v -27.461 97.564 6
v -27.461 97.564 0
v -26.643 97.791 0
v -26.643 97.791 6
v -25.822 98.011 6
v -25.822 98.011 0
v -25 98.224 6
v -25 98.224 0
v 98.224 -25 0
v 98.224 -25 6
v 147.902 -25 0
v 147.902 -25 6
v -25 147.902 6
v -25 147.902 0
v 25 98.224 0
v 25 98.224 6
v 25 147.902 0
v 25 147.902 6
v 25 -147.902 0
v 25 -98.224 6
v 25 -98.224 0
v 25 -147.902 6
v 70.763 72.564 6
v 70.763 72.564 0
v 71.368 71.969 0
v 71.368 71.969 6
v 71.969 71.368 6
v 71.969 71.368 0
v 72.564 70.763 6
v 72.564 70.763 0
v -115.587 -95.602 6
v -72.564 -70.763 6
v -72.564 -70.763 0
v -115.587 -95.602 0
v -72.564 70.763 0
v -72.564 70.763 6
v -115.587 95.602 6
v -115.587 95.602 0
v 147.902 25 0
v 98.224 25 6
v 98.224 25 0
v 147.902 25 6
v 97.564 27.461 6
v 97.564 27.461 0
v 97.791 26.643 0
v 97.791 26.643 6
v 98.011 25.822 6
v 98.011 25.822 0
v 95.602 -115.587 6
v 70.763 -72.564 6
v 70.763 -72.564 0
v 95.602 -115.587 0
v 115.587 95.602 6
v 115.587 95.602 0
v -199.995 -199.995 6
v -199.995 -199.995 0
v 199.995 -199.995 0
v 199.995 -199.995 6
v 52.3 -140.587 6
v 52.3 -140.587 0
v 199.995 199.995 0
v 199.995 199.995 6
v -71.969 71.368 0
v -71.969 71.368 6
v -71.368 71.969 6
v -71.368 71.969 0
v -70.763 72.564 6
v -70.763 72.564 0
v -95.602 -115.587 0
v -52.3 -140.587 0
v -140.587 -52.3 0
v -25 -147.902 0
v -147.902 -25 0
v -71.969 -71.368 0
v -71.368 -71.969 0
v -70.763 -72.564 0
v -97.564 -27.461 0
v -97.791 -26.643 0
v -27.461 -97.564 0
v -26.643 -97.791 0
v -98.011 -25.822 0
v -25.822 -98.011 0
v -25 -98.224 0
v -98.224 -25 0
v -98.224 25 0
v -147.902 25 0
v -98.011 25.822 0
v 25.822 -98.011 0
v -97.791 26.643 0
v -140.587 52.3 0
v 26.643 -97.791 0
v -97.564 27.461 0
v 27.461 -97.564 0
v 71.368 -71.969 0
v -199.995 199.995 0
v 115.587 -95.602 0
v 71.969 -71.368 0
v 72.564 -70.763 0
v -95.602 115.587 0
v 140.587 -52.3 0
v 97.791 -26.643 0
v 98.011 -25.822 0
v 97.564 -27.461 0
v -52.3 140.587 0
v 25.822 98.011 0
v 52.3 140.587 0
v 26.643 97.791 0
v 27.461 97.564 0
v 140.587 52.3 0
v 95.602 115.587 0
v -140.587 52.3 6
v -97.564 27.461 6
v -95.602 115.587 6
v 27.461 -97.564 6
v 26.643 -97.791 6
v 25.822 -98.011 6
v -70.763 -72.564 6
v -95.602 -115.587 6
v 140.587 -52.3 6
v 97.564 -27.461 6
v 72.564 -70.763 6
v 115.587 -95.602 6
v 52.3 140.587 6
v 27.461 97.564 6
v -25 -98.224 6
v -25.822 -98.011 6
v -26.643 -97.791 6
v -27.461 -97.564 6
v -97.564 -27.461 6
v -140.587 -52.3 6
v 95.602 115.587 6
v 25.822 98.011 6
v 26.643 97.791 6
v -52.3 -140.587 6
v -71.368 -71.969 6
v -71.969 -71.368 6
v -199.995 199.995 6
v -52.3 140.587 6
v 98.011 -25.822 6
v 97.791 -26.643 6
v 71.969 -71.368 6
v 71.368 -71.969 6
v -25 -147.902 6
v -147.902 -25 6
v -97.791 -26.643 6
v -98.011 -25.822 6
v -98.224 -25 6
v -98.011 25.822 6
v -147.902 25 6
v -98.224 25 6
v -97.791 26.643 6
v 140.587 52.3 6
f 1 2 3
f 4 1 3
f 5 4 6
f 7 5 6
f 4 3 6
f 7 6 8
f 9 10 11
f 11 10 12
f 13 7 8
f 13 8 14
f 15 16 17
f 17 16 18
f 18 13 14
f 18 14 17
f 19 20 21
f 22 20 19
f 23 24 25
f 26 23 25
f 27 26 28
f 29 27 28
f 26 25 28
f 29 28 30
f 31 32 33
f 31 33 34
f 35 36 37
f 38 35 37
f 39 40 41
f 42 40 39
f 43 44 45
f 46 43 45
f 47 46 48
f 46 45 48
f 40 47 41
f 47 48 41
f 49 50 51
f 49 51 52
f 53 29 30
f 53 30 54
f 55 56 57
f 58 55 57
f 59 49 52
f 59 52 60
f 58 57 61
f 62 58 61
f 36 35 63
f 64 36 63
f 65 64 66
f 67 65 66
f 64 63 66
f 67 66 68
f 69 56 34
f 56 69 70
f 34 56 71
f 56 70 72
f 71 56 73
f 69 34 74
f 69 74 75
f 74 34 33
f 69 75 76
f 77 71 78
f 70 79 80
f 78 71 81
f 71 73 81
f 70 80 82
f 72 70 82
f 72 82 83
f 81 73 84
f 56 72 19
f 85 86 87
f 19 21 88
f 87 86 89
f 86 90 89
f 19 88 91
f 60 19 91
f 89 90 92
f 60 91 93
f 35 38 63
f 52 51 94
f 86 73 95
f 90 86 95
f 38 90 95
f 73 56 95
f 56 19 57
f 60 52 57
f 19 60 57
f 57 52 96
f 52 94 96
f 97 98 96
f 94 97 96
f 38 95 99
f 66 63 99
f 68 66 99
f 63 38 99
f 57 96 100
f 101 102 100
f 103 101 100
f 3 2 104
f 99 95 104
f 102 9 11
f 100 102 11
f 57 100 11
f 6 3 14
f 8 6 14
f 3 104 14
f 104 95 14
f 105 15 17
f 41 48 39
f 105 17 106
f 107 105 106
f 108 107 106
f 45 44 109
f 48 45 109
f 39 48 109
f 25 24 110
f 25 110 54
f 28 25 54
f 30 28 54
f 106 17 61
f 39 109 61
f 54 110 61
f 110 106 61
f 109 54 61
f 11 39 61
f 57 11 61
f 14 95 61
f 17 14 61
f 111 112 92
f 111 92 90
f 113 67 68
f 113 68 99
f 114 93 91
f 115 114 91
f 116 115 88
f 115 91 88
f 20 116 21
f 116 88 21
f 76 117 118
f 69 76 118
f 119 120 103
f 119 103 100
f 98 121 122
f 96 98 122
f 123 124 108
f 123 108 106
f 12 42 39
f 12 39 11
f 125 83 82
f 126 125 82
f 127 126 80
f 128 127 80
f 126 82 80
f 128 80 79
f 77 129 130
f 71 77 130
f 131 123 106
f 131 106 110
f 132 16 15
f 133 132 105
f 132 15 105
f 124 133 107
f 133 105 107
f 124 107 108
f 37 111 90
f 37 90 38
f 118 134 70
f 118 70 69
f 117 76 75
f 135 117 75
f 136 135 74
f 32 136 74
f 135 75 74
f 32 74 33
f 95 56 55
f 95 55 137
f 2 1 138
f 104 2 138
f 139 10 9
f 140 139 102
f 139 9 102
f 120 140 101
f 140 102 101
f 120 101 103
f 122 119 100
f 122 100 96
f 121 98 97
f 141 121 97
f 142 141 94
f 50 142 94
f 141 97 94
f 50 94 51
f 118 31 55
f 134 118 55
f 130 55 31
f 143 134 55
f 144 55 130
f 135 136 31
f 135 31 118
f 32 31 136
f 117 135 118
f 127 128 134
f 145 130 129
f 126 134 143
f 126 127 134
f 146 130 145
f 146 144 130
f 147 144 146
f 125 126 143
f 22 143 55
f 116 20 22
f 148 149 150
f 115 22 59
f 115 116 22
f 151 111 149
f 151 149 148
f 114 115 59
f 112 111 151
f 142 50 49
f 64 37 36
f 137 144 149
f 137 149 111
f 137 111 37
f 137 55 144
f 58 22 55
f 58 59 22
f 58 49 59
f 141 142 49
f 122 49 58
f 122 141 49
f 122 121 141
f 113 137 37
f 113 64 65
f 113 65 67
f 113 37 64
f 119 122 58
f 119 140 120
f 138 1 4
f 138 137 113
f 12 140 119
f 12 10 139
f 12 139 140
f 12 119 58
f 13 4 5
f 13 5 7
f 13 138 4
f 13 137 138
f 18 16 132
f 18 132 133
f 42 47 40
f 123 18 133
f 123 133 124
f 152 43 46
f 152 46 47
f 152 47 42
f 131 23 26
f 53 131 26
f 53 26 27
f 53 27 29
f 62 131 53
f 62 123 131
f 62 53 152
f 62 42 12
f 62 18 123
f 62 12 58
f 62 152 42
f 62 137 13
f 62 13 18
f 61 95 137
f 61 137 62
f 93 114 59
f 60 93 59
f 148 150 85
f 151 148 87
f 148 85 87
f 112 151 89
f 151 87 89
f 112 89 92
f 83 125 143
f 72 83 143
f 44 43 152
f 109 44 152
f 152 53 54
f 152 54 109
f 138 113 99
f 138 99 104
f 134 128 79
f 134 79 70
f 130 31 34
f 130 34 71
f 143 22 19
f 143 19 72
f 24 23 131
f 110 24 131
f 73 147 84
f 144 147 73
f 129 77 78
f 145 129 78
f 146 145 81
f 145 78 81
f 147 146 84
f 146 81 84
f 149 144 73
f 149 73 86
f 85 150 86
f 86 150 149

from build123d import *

# Parameters (mm, degrees)
SKETCH_W           = 399.99
SKETCH_H           = 399.99
PAD_DEPTH          = 6
SKETCH002_W        = 50
SKETCH002_H        = 50
POCKET001_DEPTH    = 1137.407205
POLARPATTERN_COUNT = 12
SKETCH003_R        = 101.355603
POCKET_DEPTH       = 6.001


with BuildPart() as part:
    # Sketch → Pad (new body)
    with BuildSketch(Plane.XY):
        Rectangle(SKETCH_W, SKETCH_H)
    extrude(amount=PAD_DEPTH)

    # Sketch002 → Pocket001 (cut, through all)
    with BuildSketch(Plane.XY.offset(6)):
        with Locations((0, 122.901995)):
            Rectangle(SKETCH002_W, SKETCH002_H)
    pocket001 = extrude(amount=-POCKET001_DEPTH, mode=Mode.SUBTRACT)

    # PolarPattern: Pocket001 ×12 about axis
    polarpattern_axis = Axis((0, 0, 6), (0, 0, 1))
    for i in range(1, POLARPATTERN_COUNT):
        add(pocket001.rotate(polarpattern_axis, i * 360 / POLARPATTERN_COUNT), mode=Mode.SUBTRACT)

    # Sketch003 → Pocket (cut, through all)
    with BuildSketch(Plane(origin=(0, 0, 0), x_dir=(-1, 0, 0), z_dir=(0, 0, -1))):
        Circle(SKETCH003_R)
    extrude(amount=-POCKET_DEPTH, mode=Mode.SUBTRACT)


solid = part.part
